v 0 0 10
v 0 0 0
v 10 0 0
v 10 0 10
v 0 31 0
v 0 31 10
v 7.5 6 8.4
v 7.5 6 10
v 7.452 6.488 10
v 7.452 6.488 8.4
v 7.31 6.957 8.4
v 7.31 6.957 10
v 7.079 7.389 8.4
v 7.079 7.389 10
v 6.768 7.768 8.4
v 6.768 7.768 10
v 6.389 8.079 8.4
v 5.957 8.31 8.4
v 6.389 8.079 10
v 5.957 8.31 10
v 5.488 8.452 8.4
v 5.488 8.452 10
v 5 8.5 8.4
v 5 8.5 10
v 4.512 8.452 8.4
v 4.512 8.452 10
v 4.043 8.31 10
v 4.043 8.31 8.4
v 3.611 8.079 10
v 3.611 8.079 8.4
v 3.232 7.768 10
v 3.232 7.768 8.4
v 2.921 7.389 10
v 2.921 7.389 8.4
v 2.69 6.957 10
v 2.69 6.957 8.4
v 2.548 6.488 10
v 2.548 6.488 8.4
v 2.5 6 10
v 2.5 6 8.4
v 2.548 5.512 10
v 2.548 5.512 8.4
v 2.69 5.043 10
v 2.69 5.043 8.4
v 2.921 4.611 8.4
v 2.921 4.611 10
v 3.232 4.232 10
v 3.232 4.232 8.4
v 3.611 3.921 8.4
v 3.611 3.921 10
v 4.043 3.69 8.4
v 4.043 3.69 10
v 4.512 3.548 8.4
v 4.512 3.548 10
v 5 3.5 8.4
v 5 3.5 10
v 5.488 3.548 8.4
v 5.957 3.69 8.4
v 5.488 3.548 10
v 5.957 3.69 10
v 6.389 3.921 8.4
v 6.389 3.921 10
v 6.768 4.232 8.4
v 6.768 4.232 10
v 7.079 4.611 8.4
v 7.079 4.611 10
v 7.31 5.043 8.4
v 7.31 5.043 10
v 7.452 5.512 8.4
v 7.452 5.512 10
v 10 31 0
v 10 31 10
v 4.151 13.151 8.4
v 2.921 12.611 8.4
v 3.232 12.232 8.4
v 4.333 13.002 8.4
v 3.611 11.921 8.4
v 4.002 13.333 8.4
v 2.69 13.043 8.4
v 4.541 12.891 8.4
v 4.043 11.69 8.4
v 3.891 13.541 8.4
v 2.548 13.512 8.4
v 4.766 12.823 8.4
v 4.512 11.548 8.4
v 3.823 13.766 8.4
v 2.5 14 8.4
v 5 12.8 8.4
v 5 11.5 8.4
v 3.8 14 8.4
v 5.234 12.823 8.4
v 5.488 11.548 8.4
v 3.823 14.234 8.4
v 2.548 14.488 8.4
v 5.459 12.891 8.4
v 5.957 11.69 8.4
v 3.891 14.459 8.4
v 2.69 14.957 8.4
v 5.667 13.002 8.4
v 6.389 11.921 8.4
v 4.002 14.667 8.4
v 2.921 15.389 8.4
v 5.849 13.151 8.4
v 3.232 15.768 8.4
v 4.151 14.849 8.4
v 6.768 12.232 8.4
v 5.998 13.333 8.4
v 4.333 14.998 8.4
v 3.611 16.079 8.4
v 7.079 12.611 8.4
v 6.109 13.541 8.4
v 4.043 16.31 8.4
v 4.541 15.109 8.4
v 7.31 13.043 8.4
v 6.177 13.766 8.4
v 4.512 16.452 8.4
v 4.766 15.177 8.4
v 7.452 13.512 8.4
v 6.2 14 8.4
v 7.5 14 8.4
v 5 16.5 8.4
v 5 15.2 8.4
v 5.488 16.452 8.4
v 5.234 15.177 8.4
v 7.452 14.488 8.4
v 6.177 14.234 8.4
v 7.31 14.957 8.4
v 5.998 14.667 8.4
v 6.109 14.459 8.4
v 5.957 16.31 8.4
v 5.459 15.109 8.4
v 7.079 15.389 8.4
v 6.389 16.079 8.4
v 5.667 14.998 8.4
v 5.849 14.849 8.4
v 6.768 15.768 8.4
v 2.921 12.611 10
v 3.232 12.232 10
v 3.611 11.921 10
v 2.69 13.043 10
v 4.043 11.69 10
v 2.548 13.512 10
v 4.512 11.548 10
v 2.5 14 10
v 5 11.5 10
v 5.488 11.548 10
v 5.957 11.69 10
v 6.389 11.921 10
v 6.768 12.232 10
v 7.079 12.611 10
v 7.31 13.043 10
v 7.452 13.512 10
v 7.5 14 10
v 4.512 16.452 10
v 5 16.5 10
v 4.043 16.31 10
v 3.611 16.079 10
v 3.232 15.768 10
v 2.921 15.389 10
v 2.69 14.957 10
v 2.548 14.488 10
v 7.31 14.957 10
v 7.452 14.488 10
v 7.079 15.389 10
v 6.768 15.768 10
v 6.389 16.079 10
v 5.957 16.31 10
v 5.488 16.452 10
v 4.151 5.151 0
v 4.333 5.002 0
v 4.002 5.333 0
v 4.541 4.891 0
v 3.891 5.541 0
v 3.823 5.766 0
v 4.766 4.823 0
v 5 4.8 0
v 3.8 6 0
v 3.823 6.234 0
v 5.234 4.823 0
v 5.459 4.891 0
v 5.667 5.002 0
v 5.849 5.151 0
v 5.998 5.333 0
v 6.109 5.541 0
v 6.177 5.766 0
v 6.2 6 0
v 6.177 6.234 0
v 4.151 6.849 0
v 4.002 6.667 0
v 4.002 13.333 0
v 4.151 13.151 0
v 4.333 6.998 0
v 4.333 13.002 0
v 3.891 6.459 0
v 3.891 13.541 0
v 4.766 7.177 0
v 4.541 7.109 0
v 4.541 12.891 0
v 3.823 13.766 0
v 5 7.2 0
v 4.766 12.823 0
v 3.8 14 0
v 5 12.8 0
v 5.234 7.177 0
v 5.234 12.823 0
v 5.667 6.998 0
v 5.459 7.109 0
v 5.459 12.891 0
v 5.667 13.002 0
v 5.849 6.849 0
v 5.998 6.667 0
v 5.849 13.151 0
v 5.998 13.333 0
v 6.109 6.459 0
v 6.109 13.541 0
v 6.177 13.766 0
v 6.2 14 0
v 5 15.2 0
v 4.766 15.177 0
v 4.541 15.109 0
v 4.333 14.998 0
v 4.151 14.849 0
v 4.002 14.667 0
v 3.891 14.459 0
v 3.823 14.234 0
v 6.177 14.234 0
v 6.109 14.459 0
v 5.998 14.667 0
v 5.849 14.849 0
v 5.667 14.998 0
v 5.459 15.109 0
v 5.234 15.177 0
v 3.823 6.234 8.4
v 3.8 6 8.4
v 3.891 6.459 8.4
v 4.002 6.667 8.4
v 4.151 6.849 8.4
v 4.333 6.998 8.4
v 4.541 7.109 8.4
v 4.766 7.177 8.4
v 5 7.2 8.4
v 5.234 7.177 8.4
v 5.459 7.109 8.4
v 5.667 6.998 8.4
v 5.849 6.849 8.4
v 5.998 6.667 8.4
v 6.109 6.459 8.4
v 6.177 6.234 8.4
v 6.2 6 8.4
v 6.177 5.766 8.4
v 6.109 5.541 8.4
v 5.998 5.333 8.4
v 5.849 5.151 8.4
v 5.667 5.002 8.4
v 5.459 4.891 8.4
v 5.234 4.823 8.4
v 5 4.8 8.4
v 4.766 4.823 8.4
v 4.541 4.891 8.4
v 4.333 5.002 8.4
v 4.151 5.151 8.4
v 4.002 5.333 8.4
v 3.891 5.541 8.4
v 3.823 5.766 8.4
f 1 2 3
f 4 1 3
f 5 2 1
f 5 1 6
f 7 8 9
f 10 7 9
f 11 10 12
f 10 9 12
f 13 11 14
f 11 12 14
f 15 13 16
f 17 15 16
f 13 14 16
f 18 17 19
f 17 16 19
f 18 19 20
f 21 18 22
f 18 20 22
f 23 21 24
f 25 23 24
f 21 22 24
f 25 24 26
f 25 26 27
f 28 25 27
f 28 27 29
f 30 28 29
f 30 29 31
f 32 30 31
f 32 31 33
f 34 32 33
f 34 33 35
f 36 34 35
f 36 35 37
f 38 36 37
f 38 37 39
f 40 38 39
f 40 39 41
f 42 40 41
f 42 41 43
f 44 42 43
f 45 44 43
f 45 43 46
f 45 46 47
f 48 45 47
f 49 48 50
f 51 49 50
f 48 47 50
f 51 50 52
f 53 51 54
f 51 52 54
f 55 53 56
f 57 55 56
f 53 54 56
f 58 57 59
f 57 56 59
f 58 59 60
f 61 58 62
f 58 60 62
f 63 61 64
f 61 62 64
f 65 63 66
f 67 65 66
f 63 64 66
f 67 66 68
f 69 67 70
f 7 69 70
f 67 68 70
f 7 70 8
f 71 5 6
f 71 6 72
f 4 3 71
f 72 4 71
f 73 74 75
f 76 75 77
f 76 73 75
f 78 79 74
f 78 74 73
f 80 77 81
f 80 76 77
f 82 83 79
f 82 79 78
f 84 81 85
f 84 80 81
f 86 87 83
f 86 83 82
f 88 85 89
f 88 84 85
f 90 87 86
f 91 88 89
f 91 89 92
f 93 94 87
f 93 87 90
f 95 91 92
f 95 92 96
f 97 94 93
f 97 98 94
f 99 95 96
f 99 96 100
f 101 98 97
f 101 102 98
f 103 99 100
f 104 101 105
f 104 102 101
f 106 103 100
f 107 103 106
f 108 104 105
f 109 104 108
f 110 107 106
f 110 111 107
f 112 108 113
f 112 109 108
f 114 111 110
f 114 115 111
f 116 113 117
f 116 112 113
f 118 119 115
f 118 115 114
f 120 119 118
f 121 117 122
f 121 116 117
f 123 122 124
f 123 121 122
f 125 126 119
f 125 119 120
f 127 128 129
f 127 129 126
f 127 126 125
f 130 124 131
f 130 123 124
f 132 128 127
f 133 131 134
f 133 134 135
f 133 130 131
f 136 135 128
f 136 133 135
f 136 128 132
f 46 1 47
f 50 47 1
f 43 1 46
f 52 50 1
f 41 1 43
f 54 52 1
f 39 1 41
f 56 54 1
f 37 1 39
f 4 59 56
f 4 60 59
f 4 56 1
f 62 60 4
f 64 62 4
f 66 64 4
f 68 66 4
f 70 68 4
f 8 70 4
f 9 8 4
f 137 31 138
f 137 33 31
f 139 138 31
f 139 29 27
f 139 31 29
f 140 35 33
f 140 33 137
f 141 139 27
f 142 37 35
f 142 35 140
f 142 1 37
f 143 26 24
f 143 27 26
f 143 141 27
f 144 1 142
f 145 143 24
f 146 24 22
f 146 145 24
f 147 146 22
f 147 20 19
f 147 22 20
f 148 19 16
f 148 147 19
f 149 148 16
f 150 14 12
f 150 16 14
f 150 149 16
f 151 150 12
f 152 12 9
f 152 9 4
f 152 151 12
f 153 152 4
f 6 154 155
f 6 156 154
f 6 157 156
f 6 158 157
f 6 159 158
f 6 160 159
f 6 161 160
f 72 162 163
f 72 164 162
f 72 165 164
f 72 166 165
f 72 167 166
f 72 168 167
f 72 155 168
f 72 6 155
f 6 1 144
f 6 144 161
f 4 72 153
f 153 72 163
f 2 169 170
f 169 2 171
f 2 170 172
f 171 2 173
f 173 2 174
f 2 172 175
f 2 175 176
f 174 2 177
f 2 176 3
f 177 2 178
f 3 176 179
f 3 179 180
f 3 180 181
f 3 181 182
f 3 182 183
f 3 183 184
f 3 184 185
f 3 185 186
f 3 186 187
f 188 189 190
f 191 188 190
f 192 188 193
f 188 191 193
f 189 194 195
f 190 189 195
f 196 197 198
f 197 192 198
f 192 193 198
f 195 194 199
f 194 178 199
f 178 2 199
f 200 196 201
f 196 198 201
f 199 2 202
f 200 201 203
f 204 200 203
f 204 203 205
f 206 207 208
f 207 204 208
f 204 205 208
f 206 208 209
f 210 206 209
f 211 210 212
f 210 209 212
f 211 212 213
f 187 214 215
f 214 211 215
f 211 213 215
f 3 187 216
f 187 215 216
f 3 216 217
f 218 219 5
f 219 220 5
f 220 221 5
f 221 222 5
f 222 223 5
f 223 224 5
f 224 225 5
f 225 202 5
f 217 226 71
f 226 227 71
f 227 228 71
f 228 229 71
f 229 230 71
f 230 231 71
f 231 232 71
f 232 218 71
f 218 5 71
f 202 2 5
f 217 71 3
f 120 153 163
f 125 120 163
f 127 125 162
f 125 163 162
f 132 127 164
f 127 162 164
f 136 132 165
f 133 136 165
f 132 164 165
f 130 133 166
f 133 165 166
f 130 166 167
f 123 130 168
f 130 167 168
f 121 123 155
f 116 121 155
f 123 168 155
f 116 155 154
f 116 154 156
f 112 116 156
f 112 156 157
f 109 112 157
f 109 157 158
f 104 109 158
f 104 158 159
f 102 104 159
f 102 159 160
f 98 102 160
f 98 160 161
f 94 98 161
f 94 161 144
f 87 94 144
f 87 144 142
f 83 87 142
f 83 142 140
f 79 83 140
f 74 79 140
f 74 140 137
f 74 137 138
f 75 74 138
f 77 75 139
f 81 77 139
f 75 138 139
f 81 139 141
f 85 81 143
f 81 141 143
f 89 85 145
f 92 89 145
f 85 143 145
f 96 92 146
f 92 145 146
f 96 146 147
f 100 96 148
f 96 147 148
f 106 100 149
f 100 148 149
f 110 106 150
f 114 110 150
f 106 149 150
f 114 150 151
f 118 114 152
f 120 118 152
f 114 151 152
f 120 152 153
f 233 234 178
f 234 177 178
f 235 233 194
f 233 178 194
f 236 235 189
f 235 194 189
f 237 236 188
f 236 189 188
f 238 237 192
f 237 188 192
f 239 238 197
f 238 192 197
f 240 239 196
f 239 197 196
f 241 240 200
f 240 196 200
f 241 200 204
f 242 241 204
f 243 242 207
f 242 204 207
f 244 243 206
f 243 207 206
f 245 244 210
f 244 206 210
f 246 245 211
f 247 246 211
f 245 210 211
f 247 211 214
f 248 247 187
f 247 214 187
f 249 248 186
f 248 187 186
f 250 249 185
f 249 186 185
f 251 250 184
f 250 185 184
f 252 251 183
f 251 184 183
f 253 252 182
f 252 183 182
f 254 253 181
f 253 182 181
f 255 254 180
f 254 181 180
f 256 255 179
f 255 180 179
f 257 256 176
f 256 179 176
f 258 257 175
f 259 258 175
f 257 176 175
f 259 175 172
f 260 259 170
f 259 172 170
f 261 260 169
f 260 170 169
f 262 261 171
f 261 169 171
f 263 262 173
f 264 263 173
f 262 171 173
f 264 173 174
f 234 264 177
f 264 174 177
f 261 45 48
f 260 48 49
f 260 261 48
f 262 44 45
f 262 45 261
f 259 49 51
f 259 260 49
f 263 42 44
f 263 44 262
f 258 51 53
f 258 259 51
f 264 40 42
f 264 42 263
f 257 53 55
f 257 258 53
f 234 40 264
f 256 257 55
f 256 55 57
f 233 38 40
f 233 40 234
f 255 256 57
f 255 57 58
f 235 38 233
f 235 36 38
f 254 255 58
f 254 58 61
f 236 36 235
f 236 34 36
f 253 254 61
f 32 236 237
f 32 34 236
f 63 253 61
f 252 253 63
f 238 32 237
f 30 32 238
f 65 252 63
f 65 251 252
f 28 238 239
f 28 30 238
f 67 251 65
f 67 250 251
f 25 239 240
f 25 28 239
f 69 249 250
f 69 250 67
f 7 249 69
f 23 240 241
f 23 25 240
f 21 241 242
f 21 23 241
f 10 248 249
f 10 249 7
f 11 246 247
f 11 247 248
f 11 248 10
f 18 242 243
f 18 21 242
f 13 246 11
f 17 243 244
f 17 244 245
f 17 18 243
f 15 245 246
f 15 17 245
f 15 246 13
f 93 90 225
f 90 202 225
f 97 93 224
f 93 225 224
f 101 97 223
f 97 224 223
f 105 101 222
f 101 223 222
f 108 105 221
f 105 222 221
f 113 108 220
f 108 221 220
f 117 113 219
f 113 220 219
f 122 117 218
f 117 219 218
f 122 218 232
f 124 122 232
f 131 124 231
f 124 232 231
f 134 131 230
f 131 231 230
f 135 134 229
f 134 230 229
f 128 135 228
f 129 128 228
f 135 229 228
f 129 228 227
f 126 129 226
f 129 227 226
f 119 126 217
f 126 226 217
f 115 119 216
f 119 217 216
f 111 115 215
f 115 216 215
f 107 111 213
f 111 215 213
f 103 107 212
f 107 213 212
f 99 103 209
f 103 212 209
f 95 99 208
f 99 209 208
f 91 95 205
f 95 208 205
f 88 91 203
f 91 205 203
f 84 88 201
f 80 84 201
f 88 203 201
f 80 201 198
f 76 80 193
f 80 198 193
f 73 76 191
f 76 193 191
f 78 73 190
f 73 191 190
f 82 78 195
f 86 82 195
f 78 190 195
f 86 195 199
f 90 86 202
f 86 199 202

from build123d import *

# Parameters (mm, degrees)
SKETCH1_W                                = 10
SKETCH1_H                                = 31
BOSS_EXTRUDE1_DEPTH                      = 10
CBORE_FOR_M2_PAN_HEAD_SCREW1_D           = 2.4
CBORE_FOR_M2_PAN_HEAD_SCREW1_DEPTH       = 10
CBORE_FOR_M2_PAN_HEAD_SCREW1_CBORE_D     = 5
CBORE_FOR_M2_PAN_HEAD_SCREW1_CBORE_DEPTH = 1.6
CBORE_FOR_M2_PAN_HEAD_SCREW1_TIP         = 0.721032743


with BuildPart() as part:
    # Sketch1 → Boss-Extrude1 (new body)
    with BuildSketch(Plane.XY):
        with Locations((5, 15.5)):
            Rectangle(SKETCH1_W, SKETCH1_H)
    extrude(amount=BOSS_EXTRUDE1_DEPTH)

    # CBORE for M2 Pan Head Screw1
    with Locations(Plane(origin=(5, 14, 10), x_dir=(1, 0, 0), z_dir=(0, 0, 1))):
        with Locations((0, 0), (0, -8)):
            CounterBoreHole(CBORE_FOR_M2_PAN_HEAD_SCREW1_D / 2, CBORE_FOR_M2_PAN_HEAD_SCREW1_CBORE_D / 2, CBORE_FOR_M2_PAN_HEAD_SCREW1_CBORE_DEPTH, depth=CBORE_FOR_M2_PAN_HEAD_SCREW1_DEPTH)
            with Locations((0, 0, -(CBORE_FOR_M2_PAN_HEAD_SCREW1_DEPTH + CBORE_FOR_M2_PAN_HEAD_SCREW1_TIP / 2))):  # 118° drill point
                Cone(0, CBORE_FOR_M2_PAN_HEAD_SCREW1_D / 2, CBORE_FOR_M2_PAN_HEAD_SCREW1_TIP, mode=Mode.SUBTRACT)


solid = part.part
